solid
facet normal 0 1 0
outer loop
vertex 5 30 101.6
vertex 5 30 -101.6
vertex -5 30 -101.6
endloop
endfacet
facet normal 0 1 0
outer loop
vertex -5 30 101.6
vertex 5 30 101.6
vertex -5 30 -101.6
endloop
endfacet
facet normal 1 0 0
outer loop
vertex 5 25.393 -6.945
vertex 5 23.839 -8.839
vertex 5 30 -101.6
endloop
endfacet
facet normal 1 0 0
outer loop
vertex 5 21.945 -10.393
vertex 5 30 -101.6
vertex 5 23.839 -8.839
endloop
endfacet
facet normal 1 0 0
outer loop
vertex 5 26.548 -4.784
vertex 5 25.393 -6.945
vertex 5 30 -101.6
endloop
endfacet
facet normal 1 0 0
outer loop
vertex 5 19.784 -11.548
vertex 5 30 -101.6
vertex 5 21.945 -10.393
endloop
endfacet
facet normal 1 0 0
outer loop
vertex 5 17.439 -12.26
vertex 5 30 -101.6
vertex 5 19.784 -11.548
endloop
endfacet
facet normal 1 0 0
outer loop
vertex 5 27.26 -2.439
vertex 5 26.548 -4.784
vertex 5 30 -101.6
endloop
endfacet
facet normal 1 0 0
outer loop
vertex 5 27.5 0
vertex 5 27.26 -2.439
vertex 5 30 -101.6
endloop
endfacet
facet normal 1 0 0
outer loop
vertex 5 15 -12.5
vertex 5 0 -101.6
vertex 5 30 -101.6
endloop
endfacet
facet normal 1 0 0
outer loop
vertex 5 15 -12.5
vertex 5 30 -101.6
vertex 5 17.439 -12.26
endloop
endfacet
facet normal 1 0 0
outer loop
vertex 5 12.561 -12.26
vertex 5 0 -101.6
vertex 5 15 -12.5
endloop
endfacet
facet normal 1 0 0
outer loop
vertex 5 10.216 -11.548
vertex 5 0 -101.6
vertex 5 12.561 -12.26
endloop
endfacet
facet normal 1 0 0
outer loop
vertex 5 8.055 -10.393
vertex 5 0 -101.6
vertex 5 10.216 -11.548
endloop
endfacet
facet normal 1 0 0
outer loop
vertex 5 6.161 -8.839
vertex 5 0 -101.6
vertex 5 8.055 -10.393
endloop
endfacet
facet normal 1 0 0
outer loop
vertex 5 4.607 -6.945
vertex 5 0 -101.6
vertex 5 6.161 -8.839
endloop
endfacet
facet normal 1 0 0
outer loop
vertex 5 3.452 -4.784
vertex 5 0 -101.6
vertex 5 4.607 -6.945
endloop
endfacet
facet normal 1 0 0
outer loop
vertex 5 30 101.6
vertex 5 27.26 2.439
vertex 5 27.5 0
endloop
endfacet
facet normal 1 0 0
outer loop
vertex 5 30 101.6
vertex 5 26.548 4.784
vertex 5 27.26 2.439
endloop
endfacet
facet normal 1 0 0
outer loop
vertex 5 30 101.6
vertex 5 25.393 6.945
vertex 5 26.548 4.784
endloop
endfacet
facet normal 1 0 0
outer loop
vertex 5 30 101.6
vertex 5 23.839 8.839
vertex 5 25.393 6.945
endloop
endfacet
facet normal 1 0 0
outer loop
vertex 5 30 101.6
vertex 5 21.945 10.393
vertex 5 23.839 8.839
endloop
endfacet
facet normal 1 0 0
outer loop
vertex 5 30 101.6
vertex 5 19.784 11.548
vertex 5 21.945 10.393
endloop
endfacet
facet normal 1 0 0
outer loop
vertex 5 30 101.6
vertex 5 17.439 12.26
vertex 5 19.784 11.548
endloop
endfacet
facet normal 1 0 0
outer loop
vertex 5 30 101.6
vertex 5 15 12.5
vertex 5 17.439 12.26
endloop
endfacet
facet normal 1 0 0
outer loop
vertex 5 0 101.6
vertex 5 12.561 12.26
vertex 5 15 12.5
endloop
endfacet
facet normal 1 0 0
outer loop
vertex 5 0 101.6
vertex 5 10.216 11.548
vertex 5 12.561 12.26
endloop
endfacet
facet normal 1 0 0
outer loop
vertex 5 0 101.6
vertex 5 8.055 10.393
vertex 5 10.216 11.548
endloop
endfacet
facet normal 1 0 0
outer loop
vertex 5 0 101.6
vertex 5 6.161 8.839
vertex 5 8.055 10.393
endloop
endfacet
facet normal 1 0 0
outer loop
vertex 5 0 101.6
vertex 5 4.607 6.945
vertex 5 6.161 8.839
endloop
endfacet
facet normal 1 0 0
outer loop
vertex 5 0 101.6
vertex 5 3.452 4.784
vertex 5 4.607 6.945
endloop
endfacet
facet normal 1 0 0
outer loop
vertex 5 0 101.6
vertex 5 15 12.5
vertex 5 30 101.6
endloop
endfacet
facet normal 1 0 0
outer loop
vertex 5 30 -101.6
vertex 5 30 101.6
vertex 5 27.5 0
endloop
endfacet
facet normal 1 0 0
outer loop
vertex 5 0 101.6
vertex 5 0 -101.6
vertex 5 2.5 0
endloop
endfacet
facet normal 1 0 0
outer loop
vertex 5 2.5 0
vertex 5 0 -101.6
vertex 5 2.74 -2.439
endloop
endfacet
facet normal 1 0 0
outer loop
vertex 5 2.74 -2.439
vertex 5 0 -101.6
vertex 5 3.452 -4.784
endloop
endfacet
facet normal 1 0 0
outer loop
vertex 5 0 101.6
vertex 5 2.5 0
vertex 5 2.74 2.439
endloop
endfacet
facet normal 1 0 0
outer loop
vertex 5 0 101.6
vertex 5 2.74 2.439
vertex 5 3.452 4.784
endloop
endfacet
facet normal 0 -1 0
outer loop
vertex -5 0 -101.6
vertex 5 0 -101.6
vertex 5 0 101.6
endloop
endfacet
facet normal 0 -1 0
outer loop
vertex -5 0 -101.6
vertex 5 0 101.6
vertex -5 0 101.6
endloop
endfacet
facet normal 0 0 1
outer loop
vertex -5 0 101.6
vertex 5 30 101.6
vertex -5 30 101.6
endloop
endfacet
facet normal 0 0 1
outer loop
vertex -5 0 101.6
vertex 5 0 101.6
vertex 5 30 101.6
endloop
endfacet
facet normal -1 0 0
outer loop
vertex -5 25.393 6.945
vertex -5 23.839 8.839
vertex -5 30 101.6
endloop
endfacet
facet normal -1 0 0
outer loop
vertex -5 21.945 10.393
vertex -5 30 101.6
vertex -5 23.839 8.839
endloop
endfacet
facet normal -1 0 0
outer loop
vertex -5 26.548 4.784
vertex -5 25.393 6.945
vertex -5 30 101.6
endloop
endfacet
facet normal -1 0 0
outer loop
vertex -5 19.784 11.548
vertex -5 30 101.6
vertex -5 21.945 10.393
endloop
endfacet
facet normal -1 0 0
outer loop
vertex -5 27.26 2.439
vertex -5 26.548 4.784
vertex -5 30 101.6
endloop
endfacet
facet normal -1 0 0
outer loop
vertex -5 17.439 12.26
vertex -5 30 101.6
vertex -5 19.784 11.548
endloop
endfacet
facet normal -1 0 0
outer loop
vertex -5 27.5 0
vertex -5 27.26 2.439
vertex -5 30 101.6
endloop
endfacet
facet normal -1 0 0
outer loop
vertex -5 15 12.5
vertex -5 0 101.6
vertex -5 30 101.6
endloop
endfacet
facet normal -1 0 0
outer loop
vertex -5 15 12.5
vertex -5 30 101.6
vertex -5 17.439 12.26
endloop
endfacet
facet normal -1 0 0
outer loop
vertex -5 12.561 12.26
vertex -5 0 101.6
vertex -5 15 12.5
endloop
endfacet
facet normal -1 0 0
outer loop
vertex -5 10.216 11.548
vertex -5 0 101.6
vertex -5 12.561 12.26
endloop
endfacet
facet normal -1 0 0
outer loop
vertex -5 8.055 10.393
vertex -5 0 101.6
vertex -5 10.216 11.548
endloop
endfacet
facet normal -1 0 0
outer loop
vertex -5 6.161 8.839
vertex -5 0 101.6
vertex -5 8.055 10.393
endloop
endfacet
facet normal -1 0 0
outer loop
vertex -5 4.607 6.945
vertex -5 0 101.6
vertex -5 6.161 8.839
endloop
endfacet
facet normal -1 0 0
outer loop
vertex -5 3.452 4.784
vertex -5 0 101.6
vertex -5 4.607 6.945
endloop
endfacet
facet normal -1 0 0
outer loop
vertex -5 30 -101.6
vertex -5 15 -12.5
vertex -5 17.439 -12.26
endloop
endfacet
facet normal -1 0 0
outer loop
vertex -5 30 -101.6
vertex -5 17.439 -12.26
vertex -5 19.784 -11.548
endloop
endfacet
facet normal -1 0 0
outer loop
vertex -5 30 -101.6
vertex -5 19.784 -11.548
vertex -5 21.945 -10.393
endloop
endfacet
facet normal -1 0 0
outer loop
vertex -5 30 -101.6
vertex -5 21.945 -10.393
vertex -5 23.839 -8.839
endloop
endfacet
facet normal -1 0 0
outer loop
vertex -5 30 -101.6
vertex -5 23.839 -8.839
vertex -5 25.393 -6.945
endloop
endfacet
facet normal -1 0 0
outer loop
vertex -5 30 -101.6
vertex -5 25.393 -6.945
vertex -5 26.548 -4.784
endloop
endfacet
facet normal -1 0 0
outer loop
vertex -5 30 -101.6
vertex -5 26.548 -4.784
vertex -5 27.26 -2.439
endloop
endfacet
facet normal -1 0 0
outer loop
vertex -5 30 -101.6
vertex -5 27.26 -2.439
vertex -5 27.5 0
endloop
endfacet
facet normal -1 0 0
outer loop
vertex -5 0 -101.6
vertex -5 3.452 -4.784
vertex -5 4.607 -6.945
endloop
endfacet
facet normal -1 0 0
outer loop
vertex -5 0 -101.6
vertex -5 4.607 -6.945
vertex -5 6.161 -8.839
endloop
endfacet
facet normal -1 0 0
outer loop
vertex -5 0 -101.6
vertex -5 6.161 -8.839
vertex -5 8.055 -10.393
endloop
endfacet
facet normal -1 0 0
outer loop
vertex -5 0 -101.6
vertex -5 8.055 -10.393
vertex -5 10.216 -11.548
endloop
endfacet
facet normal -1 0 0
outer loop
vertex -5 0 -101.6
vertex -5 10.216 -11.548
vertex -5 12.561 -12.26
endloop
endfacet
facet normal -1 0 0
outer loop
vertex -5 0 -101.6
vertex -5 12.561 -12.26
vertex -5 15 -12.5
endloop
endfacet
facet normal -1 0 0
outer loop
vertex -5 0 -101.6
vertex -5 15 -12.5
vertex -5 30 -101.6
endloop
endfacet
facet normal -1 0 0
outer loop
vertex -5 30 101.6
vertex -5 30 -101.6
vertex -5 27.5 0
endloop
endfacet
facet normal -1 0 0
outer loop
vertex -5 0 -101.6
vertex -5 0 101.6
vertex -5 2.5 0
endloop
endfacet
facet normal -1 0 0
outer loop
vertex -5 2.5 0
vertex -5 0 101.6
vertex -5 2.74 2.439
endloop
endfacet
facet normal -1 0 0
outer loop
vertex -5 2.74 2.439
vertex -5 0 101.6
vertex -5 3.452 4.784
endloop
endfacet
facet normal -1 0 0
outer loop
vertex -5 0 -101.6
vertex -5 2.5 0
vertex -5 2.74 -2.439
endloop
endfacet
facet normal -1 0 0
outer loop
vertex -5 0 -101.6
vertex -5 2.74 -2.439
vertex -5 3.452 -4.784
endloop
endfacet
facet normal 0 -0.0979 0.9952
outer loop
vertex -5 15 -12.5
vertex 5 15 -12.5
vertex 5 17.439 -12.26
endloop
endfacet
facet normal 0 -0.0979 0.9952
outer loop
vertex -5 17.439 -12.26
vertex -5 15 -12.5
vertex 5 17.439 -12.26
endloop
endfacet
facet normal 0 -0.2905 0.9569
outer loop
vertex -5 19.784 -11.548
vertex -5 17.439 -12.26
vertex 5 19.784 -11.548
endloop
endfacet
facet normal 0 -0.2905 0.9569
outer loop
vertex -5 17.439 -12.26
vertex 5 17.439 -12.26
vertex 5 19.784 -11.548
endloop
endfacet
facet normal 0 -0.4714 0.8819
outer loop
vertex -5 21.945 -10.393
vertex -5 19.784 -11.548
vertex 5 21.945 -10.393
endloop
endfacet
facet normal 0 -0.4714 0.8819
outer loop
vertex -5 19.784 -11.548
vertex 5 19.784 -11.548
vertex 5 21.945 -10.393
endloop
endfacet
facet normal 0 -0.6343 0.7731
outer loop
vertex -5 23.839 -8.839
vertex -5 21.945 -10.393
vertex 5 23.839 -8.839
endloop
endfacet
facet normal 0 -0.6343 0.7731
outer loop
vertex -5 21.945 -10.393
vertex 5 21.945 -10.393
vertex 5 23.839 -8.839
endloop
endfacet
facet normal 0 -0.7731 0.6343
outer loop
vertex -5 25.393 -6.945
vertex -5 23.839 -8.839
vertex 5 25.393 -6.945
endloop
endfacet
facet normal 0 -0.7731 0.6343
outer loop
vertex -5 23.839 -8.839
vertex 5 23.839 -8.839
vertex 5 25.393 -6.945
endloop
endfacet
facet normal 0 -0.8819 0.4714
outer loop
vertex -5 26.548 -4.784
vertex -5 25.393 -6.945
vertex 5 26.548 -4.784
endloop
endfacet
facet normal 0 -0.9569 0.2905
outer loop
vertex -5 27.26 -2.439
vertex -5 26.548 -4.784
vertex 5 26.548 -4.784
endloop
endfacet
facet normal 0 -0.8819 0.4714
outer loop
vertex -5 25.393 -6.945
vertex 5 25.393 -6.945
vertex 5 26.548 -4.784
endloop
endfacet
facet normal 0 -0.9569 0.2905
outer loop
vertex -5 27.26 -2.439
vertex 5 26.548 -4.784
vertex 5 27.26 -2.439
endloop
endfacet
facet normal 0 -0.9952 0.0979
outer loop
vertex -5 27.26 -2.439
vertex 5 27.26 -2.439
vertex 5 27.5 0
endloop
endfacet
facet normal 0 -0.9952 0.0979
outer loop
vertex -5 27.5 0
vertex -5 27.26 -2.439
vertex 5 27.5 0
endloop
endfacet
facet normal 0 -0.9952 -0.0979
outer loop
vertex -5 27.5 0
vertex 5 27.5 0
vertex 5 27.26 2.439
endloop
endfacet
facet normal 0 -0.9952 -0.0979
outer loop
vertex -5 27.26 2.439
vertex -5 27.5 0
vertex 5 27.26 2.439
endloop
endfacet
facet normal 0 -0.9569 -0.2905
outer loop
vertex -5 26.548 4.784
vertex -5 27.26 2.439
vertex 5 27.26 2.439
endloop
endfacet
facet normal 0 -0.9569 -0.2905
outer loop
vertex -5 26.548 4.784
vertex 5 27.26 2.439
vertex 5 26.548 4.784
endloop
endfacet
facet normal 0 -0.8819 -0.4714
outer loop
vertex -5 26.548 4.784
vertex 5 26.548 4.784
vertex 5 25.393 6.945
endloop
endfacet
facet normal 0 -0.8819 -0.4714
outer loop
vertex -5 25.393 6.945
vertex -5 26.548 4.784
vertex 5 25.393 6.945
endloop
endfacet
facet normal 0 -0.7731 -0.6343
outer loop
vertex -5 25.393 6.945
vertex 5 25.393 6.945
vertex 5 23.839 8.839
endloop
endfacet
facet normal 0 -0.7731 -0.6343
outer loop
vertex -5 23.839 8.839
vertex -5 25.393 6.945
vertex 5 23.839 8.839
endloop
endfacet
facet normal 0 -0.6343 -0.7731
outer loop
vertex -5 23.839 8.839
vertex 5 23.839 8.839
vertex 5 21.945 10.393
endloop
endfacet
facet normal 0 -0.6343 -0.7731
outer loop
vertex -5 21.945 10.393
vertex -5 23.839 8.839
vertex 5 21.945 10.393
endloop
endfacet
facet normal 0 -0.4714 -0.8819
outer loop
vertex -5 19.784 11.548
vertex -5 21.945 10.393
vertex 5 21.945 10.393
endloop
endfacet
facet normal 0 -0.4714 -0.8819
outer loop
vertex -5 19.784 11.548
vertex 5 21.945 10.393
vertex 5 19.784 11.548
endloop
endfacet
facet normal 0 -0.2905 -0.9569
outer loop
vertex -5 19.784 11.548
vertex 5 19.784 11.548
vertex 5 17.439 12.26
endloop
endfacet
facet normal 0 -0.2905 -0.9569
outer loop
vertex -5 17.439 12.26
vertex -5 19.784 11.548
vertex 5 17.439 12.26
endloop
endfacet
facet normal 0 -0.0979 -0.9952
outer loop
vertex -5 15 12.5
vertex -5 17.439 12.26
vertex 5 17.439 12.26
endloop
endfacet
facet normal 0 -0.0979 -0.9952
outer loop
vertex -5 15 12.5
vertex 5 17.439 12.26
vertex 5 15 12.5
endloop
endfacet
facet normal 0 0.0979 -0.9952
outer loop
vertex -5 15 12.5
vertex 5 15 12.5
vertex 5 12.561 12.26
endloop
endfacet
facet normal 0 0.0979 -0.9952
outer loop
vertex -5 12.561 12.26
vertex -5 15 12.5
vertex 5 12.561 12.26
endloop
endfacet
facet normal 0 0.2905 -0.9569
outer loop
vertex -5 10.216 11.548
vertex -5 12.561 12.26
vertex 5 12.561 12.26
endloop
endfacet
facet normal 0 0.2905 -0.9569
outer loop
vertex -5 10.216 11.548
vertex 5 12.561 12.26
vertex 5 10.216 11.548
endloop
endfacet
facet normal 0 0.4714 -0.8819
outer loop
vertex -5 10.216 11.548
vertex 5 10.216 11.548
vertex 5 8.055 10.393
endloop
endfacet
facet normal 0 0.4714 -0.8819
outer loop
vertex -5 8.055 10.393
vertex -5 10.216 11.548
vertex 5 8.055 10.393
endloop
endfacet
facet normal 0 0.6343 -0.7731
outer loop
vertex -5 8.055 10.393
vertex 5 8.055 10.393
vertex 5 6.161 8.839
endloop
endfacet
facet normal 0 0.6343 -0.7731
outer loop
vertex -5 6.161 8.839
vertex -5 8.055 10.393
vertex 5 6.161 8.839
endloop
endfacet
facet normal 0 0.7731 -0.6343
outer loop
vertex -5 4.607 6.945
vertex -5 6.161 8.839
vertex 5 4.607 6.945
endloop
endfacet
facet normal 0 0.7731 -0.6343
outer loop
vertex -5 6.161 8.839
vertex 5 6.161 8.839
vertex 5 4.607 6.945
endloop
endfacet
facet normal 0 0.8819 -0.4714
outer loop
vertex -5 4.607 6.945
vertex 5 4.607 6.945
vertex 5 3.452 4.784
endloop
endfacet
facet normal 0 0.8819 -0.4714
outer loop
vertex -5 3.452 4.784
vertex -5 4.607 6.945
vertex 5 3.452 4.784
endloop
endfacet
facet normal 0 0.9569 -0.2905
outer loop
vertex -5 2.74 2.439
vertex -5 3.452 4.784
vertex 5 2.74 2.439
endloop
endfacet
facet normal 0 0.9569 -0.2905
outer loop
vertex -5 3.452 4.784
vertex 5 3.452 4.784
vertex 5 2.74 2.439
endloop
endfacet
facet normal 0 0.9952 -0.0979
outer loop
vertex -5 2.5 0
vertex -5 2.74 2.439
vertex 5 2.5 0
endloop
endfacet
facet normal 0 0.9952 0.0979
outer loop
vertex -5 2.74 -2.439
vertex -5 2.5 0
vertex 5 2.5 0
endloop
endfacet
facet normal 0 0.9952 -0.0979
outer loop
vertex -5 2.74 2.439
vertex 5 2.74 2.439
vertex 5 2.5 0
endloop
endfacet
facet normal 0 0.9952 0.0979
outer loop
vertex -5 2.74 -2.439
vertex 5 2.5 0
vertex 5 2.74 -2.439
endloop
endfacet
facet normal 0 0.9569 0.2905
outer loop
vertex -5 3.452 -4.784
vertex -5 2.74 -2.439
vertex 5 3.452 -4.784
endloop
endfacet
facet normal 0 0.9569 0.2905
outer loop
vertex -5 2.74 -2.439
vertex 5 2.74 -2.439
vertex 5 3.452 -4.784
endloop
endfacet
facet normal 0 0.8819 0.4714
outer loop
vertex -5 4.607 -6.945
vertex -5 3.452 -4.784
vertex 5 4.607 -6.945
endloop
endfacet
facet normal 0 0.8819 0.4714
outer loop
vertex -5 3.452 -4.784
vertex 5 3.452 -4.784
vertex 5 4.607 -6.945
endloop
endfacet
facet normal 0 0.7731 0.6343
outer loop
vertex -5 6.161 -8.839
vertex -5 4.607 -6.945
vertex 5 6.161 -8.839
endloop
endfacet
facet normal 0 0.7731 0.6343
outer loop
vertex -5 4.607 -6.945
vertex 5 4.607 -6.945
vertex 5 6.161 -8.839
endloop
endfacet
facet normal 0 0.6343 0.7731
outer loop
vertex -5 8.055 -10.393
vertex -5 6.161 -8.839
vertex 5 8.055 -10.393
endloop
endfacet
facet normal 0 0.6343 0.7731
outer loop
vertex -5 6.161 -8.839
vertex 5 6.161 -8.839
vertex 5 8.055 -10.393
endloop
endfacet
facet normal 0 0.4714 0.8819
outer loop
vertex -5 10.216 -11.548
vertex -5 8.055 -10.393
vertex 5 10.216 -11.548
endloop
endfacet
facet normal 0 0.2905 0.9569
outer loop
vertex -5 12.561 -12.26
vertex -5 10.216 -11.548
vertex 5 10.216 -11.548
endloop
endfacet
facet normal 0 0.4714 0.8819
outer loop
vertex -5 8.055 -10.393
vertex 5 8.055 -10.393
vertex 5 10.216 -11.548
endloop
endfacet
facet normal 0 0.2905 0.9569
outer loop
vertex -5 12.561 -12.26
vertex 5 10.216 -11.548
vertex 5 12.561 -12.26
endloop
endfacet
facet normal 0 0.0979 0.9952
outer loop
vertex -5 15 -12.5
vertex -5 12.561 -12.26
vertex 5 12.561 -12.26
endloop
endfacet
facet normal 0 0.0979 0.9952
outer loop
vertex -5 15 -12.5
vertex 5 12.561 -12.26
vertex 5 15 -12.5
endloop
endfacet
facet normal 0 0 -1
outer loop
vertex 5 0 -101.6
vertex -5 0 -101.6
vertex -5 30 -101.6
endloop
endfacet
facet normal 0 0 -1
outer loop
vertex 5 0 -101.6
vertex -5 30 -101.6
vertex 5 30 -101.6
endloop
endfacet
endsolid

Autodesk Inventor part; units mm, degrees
ref_plane "YZ Plane" through (0, 0, 0) normal (1, 0, 0) x (0, 1, 0)
ref_plane "XZ Plane" through (0, 0, 0) normal (0, 1, 0) x (-1, 0, 0)
ref_plane "XY Plane" through (0, 0, 0) normal (0, 0, 1) x (1, 0, 0)
sketch "Esboço1" plane through (0, 0, 0) normal (0, 1, 0) x (-1, 0, 0)
  line L0 (-5, 101.6) -> (5, 101.6)
  line L1 (5, 101.6) -> (5, -101.6)
  line L2 (5, -101.6) -> (-5, -101.6)
  line L3 (-5, -101.6) -> (-5, 101.6)
  line L4 (-5, 101.6) -> (5, -101.6) construction
  line L5 (5, 101.6) -> (-5, -101.6) construction
  point P0 (0, 0)
  dimension "d0" = 203.2
  dimension "d1" = 10
extrude "Extrusão1" add sketch "Esboço1" along normal blind 30
sketch "Esboço3" plane through (5, 0, 101.6) normal (1, 0, 0) x (0, 0, -1)
  line L0 (203.2, 30) -> (0, 30) projected
  circle A0 centre (101.6, 15) radius 12.5
  line L1 (0, 0) -> (203.2, 0) projected
  line L2 (203.2, 0) -> (203.2, 30) projected
  line L3 (203.2, 0) -> (0, 0) projected
  point P0 (101.6, 0)
  point P1 (101.6, 0)
  point P2 (101.6, 0)
  dimension "d4" = 25
  dimension "d7" = 15
  dimension "d10" = 0
extrude "Extrusão2" cut sketch "Esboço3" against normal blind 30
properties part number "exHelice"
